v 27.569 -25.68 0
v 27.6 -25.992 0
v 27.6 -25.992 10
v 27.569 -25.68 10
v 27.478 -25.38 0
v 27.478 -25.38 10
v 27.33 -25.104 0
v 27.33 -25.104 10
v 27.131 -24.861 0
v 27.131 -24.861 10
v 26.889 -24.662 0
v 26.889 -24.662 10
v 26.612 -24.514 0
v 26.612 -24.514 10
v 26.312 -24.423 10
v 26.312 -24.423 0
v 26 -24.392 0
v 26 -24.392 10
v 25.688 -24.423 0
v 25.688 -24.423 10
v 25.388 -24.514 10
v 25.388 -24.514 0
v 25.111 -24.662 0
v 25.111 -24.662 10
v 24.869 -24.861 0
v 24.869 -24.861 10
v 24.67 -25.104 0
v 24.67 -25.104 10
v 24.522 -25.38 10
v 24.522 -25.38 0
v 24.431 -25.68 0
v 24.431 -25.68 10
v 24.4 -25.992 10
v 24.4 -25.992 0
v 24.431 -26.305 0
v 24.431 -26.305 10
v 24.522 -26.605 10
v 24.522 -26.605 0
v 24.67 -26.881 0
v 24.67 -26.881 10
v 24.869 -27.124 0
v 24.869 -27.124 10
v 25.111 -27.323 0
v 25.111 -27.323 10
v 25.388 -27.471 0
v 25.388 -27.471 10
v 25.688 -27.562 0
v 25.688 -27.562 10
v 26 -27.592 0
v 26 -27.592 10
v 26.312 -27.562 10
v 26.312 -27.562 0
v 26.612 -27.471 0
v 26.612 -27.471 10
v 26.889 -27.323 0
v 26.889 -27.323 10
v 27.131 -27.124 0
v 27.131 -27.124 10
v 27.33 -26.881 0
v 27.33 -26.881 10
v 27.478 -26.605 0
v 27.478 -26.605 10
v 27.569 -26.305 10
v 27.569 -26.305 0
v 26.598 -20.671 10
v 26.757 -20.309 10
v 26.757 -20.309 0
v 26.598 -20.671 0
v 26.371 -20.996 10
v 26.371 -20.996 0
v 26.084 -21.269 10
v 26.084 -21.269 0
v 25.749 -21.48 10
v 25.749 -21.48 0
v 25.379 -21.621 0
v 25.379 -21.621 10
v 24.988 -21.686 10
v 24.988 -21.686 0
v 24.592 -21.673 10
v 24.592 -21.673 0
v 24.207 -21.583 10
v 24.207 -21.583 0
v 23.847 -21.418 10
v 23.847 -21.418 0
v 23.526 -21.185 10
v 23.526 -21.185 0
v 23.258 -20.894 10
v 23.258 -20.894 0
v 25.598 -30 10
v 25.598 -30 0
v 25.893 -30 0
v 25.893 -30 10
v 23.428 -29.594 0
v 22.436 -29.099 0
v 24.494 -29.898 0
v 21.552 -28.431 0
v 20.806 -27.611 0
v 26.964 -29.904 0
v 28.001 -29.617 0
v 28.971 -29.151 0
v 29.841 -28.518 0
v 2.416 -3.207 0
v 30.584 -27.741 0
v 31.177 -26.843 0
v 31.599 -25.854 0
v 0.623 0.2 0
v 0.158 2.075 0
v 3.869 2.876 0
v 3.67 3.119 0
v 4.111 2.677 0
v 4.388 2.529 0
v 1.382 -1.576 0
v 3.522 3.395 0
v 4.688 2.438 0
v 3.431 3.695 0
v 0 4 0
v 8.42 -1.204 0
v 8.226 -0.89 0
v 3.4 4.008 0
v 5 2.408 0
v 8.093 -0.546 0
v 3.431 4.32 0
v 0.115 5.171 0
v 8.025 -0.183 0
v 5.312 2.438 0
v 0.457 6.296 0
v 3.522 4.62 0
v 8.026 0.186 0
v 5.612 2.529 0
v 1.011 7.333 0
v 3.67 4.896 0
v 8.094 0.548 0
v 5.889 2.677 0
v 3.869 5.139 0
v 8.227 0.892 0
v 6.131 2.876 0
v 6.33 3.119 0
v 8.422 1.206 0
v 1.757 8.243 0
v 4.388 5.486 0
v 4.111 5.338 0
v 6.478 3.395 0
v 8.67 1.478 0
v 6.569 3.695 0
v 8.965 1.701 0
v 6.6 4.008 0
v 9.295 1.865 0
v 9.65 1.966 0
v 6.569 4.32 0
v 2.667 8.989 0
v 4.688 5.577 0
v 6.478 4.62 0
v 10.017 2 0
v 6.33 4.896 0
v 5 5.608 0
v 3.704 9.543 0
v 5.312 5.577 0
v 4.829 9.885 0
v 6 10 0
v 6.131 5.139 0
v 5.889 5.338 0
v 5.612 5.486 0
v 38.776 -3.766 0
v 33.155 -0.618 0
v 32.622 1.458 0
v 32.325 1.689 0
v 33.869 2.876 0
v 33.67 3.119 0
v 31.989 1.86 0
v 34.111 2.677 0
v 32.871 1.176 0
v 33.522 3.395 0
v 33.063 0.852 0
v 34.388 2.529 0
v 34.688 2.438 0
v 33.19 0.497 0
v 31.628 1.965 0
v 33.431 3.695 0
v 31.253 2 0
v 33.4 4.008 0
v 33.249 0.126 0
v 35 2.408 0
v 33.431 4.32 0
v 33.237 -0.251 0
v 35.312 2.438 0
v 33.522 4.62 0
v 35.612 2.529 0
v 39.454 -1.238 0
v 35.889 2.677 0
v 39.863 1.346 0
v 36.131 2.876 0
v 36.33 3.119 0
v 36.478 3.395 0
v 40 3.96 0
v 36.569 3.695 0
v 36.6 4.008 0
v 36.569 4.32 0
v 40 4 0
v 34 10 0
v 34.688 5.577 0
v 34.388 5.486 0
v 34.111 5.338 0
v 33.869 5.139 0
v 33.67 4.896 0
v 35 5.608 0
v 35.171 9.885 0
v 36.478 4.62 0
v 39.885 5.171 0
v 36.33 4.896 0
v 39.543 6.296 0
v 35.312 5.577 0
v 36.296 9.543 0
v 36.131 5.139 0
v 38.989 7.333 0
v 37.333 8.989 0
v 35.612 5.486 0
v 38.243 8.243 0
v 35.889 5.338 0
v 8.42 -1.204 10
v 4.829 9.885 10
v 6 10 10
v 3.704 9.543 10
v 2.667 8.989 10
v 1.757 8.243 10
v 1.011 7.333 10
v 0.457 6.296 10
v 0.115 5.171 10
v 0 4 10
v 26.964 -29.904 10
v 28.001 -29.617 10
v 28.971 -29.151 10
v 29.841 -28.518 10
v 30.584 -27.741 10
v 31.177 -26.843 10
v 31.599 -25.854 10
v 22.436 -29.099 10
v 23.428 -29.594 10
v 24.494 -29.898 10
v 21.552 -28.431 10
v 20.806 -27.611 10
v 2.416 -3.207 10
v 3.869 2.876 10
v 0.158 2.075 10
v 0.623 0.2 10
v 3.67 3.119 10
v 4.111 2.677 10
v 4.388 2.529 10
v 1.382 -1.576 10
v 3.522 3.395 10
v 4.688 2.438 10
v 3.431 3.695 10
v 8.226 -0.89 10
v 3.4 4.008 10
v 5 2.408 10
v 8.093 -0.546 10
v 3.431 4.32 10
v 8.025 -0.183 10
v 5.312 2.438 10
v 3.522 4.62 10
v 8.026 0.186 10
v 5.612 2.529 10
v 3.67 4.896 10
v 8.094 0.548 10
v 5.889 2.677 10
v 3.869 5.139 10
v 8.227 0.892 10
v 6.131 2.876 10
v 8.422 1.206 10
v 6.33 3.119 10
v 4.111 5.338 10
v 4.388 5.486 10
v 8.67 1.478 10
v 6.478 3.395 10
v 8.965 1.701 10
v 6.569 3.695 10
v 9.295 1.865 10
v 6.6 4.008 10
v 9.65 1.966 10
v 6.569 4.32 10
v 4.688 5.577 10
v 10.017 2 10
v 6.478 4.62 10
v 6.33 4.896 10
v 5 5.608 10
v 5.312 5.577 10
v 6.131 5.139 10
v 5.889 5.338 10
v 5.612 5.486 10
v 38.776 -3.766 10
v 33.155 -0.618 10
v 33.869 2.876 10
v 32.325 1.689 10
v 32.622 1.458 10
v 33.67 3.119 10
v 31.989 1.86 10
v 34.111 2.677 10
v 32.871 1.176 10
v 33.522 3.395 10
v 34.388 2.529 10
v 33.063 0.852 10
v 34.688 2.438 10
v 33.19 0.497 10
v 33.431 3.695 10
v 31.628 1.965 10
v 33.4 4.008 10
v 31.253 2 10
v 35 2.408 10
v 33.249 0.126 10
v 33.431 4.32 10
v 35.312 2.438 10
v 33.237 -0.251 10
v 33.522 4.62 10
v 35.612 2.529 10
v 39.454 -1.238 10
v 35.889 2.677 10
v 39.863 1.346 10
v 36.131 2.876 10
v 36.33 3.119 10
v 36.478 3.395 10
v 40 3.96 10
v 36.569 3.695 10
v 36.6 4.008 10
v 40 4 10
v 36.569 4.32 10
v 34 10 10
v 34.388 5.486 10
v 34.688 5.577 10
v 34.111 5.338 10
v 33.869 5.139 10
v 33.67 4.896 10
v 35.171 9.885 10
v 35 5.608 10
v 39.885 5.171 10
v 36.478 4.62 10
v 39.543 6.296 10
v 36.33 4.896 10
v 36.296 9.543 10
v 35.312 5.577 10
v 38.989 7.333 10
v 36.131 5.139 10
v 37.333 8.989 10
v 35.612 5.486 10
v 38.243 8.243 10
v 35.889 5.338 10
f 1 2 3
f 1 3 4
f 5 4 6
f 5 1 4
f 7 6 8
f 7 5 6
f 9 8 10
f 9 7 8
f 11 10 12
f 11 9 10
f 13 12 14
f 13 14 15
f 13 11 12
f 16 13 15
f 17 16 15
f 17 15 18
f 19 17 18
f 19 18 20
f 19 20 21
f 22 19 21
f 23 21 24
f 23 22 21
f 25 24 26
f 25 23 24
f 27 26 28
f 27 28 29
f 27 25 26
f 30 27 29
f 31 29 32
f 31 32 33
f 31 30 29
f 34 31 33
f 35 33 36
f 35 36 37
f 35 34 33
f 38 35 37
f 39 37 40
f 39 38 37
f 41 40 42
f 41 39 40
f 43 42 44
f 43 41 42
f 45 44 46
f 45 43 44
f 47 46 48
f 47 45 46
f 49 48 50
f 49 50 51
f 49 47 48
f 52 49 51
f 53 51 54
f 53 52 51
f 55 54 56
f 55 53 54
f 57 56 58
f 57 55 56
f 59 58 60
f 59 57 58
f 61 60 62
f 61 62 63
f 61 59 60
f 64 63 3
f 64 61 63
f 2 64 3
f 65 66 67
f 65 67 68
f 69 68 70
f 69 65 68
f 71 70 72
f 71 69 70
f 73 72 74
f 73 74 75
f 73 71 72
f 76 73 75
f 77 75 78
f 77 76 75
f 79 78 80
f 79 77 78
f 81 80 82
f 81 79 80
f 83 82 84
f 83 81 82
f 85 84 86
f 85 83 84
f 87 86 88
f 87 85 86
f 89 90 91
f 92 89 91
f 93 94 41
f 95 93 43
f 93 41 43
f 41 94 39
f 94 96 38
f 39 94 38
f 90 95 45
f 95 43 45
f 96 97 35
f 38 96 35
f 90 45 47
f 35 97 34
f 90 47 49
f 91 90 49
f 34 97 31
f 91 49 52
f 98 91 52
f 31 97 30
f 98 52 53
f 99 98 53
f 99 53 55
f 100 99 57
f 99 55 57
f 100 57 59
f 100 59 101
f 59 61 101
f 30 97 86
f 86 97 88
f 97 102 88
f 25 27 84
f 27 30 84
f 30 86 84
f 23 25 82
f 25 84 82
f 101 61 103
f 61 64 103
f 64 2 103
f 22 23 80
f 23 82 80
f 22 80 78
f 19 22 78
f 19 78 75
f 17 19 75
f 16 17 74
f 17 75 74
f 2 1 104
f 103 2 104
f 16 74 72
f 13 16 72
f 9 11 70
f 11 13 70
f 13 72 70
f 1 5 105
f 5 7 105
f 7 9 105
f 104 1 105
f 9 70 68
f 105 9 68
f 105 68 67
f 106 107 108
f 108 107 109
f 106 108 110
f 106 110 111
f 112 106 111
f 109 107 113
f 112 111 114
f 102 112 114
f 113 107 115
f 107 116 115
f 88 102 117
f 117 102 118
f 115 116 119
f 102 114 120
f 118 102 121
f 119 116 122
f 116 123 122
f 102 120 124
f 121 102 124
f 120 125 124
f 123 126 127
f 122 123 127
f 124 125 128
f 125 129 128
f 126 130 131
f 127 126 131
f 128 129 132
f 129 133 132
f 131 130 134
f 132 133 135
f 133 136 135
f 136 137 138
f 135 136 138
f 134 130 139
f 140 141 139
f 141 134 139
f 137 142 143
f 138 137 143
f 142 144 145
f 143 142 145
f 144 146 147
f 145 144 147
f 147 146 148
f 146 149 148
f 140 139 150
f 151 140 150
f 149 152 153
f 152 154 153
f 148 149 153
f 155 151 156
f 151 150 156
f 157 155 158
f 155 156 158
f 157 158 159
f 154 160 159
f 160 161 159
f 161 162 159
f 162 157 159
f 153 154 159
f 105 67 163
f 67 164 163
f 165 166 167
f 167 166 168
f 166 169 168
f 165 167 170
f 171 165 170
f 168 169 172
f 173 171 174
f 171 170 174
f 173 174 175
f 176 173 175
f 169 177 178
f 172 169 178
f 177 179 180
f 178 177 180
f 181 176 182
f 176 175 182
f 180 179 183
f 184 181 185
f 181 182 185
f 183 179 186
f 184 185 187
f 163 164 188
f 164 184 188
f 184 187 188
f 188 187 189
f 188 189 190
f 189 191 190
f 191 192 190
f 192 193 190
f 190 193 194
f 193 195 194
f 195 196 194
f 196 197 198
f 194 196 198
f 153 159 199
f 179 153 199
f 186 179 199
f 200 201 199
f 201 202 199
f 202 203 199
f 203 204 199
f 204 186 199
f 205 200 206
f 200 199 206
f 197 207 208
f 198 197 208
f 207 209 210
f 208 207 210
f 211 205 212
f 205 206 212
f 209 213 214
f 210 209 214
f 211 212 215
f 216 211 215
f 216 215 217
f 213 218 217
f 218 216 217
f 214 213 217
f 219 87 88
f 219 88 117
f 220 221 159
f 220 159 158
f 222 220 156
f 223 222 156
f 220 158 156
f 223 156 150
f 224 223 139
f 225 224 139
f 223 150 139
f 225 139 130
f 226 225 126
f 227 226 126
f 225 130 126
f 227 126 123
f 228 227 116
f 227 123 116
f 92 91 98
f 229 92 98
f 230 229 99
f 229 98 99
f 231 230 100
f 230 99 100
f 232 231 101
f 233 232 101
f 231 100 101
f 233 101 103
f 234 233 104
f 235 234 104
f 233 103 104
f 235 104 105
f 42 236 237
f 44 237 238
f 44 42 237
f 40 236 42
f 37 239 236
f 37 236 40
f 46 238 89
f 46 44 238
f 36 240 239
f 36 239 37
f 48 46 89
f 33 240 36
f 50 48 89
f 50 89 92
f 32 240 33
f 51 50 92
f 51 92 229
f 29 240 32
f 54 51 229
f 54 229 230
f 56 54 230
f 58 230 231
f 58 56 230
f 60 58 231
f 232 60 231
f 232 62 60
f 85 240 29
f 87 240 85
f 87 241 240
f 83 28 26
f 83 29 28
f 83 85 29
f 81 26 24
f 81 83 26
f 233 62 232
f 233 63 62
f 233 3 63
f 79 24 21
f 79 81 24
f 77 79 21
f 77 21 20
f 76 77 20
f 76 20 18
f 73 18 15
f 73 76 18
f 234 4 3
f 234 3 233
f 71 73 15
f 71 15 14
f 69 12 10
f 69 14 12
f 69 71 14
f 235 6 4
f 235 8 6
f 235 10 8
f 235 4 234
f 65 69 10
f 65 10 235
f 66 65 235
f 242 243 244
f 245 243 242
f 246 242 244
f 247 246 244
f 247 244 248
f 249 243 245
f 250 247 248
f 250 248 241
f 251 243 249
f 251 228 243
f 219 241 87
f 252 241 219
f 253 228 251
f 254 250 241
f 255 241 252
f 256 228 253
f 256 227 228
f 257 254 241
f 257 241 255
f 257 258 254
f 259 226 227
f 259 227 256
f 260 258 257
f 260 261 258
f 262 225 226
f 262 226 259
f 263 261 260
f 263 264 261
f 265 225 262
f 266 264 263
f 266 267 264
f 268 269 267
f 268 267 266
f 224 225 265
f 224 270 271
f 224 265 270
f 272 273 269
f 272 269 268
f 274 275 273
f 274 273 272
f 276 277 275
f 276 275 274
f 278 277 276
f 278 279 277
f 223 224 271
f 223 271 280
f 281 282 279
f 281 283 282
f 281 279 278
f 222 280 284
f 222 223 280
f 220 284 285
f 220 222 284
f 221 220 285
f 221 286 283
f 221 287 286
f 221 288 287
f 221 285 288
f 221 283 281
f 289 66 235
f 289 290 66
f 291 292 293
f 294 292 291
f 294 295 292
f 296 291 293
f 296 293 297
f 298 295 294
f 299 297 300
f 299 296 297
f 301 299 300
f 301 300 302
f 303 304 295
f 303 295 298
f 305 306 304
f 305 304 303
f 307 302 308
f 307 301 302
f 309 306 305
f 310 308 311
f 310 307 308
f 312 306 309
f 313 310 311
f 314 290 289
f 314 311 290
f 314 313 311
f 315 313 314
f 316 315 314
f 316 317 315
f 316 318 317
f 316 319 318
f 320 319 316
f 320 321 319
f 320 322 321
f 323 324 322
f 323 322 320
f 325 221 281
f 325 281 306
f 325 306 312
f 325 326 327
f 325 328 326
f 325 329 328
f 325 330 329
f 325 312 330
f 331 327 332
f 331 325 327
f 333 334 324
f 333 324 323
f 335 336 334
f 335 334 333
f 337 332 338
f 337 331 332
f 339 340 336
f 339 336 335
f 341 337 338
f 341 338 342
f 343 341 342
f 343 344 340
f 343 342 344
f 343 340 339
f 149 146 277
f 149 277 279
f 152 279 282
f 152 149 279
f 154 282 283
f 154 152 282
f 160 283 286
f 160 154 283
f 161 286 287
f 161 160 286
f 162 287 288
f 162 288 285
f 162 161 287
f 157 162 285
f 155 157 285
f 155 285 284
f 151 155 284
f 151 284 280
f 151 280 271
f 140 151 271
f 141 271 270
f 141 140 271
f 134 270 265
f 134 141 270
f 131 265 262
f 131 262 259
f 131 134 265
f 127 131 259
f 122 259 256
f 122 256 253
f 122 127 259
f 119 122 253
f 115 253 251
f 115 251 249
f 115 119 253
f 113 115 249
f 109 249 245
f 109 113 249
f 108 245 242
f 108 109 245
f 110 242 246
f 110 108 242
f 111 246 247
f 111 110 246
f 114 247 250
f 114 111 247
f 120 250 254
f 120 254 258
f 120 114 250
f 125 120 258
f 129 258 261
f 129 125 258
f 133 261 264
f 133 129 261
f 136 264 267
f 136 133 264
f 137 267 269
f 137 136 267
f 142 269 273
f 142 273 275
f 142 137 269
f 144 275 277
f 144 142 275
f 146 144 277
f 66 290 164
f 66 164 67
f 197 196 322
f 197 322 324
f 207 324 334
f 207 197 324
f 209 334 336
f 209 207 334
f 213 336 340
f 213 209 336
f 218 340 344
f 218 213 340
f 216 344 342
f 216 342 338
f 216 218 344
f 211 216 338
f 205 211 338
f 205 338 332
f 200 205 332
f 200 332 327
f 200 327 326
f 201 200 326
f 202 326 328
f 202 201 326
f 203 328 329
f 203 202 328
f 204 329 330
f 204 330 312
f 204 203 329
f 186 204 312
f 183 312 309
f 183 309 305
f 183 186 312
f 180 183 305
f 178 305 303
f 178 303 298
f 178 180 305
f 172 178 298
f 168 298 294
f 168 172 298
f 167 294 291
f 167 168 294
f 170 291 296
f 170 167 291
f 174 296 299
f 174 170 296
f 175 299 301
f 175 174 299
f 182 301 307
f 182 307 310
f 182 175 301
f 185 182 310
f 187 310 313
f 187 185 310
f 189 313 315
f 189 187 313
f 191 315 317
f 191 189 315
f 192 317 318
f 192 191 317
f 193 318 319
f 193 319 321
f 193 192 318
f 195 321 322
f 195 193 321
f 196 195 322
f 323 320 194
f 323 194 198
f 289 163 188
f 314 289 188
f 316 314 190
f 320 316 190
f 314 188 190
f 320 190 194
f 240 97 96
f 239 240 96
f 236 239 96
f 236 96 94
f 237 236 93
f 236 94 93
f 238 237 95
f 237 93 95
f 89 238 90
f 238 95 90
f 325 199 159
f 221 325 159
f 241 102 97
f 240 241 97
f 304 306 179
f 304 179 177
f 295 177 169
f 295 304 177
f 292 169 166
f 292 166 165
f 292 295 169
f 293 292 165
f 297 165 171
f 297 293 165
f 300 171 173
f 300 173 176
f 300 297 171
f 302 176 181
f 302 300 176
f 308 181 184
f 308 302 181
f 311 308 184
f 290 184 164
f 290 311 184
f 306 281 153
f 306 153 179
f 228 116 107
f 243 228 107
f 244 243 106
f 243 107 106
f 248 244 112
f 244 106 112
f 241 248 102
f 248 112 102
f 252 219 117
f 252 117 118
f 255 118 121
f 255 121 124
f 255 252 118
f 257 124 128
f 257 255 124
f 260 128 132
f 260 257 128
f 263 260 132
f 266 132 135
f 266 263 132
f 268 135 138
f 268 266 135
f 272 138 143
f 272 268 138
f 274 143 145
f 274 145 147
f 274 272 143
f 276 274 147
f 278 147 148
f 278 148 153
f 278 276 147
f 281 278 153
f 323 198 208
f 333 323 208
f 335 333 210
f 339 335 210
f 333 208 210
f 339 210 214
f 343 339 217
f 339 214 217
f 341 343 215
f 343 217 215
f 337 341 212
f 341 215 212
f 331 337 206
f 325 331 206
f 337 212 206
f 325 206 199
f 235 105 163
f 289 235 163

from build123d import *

# Parameters (mm, degrees)
EXTRUDE_1_OUTLINE_R = 1.6
EXTRUDE_1_DEPTH     = 10
CUT_EXTRUDE_2_DEPTH = 10


# Read off the part's stored shape, not the designer's step: 凸台-拉伸1
with BuildPart() as part:
    # 凸台-拉伸1 outline → 凸台-拉伸1 (new body)
    with BuildSketch(Plane.XY):
        with BuildLine():
            Line((31.599493043, -25.854101966), (38.776412907, -3.765813851))
            ThreePointArc((38.776412907, -3.765813851), (39.692208515, 0.048749382), (40, 3.959611008))
            Line((40, 3.959611008), (40, 4))
            ThreePointArc((40, 4), (38.242640687, 8.242640687), (34, 10))
            Line((34, 10), (6, 10))
            ThreePointArc((6, 10), (1.757359313, 8.242640687), (0, 4))
            ThreePointArc((0, 4), (0.622521006, 0.200308091), (2.416373879, -3.206636444))
            Line((2.416373879, -3.206636444), (20.806298091, -27.610890139))
            ThreePointArc((20.806298091, -27.610890139), (22.920924272, -29.36960617), (25.598111151, -30))
            Line((25.598111151, -30), (25.893153945, -30))
            ThreePointArc((25.893153945, -30), (29.419865459, -28.854101966), (31.599493043, -25.854101966))
        make_face()
        with Locations((26, -25.992428083)):
            Circle(EXTRUDE_1_OUTLINE_R, mode=Mode.SUBTRACT)
        with Locations((5, 4.007571917)):
            Circle(EXTRUDE_1_OUTLINE_R, mode=Mode.SUBTRACT)
        with Locations((35, 4.007571917)):
            Circle(EXTRUDE_1_OUTLINE_R, mode=Mode.SUBTRACT)
    extrude(amount=EXTRUDE_1_DEPTH)

    # 草图3 → 切除-拉伸2 (cut)
    with BuildSketch(Plane.XY.offset(10)):
        with BuildLine():
            ThreePointArc((8.419814245, -1.203630046), (8.227216542, 0.892395626), (10.017085265, 2))
            Line((10.017085265, 2), (31.252942008, 2))
            ThreePointArc((31.252942008, 2), (32.870975997, 1.175570505), (33.15505504, -0.618033989))
            Line((33.15505504, -0.618033989), (26.757172713, -20.3086911))
            ThreePointArc((26.757172713, -20.3086911), (25.185154892, -21.663228314), (23.25778866, -20.894287158))
            Line((23.25778866, -20.894287158), (8.419814245, -1.203630046))
        make_face()
    extrude(amount=-CUT_EXTRUDE_2_DEPTH, mode=Mode.SUBTRACT)


solid = part.part
